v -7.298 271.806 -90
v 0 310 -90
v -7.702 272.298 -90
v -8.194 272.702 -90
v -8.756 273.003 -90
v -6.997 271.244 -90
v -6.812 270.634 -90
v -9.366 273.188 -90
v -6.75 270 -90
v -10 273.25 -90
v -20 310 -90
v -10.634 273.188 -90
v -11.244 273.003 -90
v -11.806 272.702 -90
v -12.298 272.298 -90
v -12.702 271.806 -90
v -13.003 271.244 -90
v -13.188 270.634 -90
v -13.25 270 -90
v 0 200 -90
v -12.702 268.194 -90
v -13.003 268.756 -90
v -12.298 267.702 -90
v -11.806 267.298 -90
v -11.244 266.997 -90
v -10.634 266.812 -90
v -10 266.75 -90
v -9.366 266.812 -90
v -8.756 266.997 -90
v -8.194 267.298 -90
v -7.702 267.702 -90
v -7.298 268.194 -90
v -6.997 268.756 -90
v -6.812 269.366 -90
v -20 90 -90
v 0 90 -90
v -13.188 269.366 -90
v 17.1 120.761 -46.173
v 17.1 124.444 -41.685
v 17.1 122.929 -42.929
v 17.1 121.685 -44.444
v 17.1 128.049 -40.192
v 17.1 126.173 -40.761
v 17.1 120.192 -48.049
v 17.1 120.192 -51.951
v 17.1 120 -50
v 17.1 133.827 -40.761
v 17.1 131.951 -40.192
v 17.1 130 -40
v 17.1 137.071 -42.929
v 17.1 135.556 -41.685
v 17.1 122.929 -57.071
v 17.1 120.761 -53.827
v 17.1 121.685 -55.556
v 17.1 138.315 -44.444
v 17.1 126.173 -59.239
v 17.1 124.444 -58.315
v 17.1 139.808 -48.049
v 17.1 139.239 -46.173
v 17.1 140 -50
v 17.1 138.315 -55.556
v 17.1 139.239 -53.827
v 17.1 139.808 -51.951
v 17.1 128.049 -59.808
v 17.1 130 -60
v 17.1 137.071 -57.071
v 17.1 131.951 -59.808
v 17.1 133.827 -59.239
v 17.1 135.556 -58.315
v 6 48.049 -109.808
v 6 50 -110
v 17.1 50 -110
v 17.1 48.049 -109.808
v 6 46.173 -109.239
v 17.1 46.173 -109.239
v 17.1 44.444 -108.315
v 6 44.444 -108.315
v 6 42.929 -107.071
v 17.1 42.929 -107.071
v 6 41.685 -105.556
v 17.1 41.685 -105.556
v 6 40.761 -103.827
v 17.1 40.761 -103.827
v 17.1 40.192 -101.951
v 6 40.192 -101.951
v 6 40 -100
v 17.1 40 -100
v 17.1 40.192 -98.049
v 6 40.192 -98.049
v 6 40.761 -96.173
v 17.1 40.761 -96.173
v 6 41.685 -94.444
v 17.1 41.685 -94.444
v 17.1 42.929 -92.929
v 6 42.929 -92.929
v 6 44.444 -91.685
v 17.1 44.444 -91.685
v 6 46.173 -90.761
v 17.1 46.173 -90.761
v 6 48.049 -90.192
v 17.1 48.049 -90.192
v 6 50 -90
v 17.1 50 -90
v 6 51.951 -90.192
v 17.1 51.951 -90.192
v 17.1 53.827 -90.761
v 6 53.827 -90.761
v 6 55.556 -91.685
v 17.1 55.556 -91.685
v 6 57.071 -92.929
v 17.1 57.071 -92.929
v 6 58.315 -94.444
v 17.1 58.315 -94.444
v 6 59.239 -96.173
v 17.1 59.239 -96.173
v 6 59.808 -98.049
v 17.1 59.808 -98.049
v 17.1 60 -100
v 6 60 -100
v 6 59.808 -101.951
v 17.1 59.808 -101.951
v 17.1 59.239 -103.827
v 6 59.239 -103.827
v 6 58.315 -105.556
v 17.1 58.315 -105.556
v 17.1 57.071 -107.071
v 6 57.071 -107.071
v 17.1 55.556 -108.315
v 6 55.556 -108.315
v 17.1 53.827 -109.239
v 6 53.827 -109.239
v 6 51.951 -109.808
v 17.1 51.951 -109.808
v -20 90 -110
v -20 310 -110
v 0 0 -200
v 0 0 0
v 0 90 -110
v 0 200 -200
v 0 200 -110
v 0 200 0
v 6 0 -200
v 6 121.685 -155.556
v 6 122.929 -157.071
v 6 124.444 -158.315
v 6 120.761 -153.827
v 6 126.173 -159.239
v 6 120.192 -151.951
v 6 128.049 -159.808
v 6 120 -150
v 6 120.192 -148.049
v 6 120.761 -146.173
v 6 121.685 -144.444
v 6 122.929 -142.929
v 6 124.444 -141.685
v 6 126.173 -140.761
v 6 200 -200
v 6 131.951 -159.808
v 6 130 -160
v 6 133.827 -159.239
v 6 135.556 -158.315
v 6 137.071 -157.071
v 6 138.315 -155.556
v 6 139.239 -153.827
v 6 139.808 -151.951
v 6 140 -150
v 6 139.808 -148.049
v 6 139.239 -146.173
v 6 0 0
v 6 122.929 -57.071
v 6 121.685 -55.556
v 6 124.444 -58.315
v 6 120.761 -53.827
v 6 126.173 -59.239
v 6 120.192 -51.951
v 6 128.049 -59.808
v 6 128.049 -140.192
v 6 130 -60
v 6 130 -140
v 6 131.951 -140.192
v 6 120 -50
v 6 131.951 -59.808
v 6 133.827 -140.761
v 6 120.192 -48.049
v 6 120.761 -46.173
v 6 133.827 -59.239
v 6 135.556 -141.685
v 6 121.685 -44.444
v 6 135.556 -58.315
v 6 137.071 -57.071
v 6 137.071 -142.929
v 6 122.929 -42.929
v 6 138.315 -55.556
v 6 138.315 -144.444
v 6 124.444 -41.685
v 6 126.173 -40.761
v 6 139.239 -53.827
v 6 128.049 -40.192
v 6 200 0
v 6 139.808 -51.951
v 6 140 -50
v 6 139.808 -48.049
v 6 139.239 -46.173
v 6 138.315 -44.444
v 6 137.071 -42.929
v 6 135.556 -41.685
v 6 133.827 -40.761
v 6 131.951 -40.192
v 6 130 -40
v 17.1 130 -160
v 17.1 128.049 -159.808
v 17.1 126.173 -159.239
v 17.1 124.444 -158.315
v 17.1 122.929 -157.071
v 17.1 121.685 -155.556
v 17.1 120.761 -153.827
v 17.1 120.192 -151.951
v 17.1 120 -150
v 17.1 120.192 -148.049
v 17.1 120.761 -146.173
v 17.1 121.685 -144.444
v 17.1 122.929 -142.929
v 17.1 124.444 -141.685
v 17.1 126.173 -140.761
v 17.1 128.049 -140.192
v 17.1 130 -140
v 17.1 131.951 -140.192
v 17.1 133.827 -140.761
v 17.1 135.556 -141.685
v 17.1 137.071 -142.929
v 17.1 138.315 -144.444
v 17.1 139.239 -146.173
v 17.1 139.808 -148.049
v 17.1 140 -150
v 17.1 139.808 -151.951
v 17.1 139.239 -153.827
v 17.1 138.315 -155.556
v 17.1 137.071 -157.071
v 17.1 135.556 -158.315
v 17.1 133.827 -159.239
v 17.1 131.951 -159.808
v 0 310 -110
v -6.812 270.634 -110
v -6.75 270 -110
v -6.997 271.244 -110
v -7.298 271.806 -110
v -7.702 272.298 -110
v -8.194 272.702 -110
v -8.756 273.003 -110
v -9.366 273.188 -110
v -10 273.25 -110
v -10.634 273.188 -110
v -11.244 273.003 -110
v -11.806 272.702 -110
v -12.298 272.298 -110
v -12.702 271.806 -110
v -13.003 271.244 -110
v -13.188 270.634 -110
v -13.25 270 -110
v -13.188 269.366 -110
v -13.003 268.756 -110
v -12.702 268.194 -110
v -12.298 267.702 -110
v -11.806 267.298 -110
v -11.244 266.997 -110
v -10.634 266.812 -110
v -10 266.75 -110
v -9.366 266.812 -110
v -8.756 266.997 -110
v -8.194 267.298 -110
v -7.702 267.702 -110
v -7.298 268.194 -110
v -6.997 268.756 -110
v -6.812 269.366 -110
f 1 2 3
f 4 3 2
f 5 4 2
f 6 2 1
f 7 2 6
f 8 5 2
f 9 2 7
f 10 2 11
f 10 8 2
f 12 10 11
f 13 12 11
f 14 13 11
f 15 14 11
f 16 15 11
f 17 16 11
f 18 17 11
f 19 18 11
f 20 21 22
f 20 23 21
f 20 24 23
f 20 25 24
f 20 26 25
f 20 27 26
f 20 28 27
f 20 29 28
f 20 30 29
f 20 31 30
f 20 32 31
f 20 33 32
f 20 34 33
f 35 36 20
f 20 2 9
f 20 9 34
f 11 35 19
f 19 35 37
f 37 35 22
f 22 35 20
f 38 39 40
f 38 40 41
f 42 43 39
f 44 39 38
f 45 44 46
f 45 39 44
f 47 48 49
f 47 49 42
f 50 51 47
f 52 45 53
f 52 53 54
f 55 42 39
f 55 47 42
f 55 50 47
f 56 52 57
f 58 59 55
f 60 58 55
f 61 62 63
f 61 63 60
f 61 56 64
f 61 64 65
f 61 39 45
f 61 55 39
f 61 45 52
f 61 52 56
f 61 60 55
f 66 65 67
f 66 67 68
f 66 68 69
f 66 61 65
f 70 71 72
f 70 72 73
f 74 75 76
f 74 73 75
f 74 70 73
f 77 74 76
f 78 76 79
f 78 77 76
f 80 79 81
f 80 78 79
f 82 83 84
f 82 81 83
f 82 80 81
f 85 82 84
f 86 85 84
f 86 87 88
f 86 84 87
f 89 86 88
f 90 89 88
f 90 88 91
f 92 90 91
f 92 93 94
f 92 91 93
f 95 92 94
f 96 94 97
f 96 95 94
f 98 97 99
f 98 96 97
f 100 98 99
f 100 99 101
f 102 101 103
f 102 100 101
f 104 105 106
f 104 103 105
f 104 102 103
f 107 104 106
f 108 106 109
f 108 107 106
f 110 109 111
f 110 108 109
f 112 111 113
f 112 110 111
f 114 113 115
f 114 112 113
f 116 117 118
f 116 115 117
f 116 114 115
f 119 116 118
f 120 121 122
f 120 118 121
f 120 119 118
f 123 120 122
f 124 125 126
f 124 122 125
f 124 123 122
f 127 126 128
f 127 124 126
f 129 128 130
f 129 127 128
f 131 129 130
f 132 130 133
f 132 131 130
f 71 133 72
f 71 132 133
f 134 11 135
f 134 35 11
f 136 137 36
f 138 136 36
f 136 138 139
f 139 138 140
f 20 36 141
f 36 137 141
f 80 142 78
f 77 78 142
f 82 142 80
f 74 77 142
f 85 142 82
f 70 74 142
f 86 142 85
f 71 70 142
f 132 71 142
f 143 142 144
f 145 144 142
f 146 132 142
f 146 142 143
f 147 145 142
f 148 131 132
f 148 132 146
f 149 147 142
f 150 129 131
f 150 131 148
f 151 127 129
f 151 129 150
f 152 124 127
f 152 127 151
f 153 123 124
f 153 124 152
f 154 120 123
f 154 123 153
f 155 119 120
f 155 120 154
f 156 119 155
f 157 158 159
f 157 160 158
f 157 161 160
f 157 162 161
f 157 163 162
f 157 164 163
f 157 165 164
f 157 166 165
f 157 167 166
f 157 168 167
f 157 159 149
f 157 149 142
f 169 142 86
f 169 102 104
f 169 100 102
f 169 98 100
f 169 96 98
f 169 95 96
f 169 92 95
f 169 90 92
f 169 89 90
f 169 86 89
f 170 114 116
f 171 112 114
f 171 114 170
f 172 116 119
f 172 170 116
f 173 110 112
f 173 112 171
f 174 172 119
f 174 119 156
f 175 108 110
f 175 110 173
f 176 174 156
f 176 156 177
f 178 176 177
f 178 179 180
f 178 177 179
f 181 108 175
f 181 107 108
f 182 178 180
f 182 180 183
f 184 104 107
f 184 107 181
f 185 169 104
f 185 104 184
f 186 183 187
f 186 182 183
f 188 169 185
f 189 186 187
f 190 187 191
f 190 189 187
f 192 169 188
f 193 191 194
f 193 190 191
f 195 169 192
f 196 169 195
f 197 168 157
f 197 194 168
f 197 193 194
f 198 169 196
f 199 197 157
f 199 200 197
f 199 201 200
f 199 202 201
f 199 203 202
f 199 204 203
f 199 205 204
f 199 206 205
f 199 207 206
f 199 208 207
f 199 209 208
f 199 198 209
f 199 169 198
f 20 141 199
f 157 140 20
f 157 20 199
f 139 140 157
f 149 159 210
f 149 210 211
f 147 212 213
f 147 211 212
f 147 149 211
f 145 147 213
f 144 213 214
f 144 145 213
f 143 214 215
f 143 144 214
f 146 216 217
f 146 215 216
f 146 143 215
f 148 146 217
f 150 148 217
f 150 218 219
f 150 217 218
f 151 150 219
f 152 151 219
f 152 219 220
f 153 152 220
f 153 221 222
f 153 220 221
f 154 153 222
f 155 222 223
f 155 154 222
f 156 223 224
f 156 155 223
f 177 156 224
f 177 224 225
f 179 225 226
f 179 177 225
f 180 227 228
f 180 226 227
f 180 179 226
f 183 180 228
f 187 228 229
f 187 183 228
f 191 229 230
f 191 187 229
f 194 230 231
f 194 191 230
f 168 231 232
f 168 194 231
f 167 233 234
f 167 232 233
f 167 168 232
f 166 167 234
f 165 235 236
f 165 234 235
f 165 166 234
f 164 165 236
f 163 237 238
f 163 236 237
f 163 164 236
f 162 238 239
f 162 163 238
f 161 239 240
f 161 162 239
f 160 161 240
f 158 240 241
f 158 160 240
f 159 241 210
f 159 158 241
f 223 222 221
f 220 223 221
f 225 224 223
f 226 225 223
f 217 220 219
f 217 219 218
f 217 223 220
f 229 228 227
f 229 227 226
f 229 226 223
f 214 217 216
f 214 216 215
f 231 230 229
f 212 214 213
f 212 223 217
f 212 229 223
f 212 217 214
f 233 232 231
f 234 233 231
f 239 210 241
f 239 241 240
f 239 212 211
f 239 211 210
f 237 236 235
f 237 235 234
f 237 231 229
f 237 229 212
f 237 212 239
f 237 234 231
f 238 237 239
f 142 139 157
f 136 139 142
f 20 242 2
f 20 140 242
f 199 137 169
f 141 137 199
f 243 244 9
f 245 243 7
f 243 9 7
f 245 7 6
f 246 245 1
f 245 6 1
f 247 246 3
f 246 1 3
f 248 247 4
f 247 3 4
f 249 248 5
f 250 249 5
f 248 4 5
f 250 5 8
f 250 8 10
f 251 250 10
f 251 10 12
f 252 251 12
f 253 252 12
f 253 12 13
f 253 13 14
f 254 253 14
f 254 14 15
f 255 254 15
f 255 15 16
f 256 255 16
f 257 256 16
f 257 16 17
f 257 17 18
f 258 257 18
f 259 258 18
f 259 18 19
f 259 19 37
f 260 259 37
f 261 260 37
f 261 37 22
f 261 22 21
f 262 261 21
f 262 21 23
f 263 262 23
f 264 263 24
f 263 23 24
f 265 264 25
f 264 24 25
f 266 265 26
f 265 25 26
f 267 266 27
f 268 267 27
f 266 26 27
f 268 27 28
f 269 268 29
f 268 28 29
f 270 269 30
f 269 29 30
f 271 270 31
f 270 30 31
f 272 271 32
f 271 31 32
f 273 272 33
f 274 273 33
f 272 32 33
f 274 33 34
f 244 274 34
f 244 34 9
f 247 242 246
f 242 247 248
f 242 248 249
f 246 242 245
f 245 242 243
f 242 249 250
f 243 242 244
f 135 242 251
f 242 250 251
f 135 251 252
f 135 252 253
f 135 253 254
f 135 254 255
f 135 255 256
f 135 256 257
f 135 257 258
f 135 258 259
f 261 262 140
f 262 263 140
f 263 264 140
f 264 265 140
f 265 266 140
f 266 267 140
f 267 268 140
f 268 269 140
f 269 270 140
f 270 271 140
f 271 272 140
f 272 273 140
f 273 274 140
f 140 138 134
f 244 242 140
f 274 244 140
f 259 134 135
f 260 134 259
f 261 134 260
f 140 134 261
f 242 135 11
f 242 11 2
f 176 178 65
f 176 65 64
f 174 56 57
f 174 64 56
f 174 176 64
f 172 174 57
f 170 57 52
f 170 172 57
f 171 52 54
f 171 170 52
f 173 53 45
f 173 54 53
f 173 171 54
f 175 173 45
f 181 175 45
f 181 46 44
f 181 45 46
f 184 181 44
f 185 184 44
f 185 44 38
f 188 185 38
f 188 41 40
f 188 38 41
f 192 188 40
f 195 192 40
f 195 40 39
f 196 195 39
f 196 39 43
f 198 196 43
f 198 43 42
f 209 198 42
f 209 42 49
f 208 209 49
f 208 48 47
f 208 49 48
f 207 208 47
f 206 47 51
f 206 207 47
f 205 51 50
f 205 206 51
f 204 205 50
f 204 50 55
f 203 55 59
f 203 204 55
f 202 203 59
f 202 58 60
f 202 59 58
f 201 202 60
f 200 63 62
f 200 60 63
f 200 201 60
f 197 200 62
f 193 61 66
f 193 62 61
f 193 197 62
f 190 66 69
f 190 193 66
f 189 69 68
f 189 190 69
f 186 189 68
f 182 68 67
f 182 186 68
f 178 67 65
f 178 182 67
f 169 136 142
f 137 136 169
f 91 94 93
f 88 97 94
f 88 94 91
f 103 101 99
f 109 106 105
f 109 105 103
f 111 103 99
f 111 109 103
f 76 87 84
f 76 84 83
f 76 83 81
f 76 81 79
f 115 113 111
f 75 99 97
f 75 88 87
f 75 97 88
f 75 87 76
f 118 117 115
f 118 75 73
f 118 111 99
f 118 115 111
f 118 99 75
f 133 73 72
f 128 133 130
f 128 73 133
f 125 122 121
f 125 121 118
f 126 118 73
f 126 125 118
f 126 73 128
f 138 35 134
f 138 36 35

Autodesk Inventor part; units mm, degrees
ref_plane "YZ Plane" through (0, 0, 0) normal (1, 0, 0) x (0, 1, 0)
ref_plane "XZ Plane" through (0, 0, 0) normal (0, 1, 0) x (-1, 0, 0)
ref_plane "XY Plane" through (0, 0, 0) normal (0, 0, 1) x (1, 0, 0)
sketch "Sketch1" plane through (0, 0, 0) normal (1, 0, 0) x (0, 1, 0)
  line L0 (0, 0) -> (200, 0)
  line L1 (200, 0) -> (200, -200)
  line L2 (200, -200) -> (0, -200)
  line L3 (0, -200) -> (0, 0)
  dimension "d0" = 200
  dimension "d1" = 200
extrude "Extrusion1" add sketch "Sketch1" along normal blind 6
sketch "Sketch2" plane through (6, 0, 0) normal (1, 0, 0) x (0, 0, -1)
  line L0 (0, 200) -> (0, 0) projected
  line L1 (0, 0) -> (200, 0) projected
  line L2 (200, 0) -> (200, 200) projected
  line L3 (200, 200) -> (0, 200) projected
  circle A0 centre (50, 130) radius 10
  circle A1 centre (150, 130) radius 10
  circle A2 centre (100, 50) radius 10
  dimension "d4" = 20
  dimension "d5" = 20
  dimension "d6" = 20
  dimension "d7" = 100
  dimension "d8" = 50
  dimension "d9" = 80
  dimension "d10" = 100
  dimension "d11" = 50
  dimension "d12" = 80
extrude "Extrusion2" add sketch "Sketch2" along normal blind 11.1 contours A0 | A1 | A2
sketch "Sketch3" plane through (0, 0, 0) normal (-1, 0, 0) x (0, 0, 1)
  line L0 (0, 0) -> (0, 200) projected
  line L1 (0, 200) -> (-200, 200) projected
  line L2 (-200, 200) -> (-200, 0) projected
  line L3 (-200, 0) -> (0, 0) projected
  line L4 (-110, 110) -> (-90, 110)
  line L5 (-90, 110) -> (-90, 90)
  line L6 (-90, 90) -> (-110, 90)
  line L7 (-110, 90) -> (-110, 110)
  dimension "d15" = 20
  dimension "d16" = 20
  dimension "d17" = 90
  dimension "d18" = 90
extrude "Extrusion3" add sketch "Sketch3" along normal blind 20 contours L4 L5 L6 L7
sketch "Sketch4" plane through (0, 110, -90) normal (0, 1, 0) x (1, 0, 0)
  line L0 (0, 20) -> (0, 0) projected
  line L1 (0, 20) -> (-20, 20) projected
  line L2 (-20, 0) -> (-20, 20) projected
  line L3 (0, 0) -> (-20, 0) projected
  line L4 (-20, 0) -> (0, 0)
  line L5 (0, 0) -> (0, 20)
  line L6 (0, 20) -> (-20, 20)
  line L7 (-20, 20) -> (-20, 0)
  point P0 (0, -90)
extrude "Extrusion4" add sketch "Sketch4" along normal blind 200
sketch "Sketch5" plane through (-20, 90, -90) normal (0, 0, 1) x (1, 0, 0)
  line L0 (20, 110) -> (20, 0) projected
  line L1 (20, 110) -> (20, 220) projected
  line L2 (0, 220) -> (20, 220) projected
  line L3 (0, 0) -> (0, 220) projected
  line L4 (20, 0) -> (0, 0) projected
  circle A0 centre (10, 180) radius 3.25
  point P0 (20, -90)
  dimension "d23" = 6.5
  dimension "d24" = 40
  dimension "d25" = 10
extrude "Extrusion5" cut sketch "Sketch5" against normal up to next contours A0
properties part number "Arm_Base-Rod-Rev2"
